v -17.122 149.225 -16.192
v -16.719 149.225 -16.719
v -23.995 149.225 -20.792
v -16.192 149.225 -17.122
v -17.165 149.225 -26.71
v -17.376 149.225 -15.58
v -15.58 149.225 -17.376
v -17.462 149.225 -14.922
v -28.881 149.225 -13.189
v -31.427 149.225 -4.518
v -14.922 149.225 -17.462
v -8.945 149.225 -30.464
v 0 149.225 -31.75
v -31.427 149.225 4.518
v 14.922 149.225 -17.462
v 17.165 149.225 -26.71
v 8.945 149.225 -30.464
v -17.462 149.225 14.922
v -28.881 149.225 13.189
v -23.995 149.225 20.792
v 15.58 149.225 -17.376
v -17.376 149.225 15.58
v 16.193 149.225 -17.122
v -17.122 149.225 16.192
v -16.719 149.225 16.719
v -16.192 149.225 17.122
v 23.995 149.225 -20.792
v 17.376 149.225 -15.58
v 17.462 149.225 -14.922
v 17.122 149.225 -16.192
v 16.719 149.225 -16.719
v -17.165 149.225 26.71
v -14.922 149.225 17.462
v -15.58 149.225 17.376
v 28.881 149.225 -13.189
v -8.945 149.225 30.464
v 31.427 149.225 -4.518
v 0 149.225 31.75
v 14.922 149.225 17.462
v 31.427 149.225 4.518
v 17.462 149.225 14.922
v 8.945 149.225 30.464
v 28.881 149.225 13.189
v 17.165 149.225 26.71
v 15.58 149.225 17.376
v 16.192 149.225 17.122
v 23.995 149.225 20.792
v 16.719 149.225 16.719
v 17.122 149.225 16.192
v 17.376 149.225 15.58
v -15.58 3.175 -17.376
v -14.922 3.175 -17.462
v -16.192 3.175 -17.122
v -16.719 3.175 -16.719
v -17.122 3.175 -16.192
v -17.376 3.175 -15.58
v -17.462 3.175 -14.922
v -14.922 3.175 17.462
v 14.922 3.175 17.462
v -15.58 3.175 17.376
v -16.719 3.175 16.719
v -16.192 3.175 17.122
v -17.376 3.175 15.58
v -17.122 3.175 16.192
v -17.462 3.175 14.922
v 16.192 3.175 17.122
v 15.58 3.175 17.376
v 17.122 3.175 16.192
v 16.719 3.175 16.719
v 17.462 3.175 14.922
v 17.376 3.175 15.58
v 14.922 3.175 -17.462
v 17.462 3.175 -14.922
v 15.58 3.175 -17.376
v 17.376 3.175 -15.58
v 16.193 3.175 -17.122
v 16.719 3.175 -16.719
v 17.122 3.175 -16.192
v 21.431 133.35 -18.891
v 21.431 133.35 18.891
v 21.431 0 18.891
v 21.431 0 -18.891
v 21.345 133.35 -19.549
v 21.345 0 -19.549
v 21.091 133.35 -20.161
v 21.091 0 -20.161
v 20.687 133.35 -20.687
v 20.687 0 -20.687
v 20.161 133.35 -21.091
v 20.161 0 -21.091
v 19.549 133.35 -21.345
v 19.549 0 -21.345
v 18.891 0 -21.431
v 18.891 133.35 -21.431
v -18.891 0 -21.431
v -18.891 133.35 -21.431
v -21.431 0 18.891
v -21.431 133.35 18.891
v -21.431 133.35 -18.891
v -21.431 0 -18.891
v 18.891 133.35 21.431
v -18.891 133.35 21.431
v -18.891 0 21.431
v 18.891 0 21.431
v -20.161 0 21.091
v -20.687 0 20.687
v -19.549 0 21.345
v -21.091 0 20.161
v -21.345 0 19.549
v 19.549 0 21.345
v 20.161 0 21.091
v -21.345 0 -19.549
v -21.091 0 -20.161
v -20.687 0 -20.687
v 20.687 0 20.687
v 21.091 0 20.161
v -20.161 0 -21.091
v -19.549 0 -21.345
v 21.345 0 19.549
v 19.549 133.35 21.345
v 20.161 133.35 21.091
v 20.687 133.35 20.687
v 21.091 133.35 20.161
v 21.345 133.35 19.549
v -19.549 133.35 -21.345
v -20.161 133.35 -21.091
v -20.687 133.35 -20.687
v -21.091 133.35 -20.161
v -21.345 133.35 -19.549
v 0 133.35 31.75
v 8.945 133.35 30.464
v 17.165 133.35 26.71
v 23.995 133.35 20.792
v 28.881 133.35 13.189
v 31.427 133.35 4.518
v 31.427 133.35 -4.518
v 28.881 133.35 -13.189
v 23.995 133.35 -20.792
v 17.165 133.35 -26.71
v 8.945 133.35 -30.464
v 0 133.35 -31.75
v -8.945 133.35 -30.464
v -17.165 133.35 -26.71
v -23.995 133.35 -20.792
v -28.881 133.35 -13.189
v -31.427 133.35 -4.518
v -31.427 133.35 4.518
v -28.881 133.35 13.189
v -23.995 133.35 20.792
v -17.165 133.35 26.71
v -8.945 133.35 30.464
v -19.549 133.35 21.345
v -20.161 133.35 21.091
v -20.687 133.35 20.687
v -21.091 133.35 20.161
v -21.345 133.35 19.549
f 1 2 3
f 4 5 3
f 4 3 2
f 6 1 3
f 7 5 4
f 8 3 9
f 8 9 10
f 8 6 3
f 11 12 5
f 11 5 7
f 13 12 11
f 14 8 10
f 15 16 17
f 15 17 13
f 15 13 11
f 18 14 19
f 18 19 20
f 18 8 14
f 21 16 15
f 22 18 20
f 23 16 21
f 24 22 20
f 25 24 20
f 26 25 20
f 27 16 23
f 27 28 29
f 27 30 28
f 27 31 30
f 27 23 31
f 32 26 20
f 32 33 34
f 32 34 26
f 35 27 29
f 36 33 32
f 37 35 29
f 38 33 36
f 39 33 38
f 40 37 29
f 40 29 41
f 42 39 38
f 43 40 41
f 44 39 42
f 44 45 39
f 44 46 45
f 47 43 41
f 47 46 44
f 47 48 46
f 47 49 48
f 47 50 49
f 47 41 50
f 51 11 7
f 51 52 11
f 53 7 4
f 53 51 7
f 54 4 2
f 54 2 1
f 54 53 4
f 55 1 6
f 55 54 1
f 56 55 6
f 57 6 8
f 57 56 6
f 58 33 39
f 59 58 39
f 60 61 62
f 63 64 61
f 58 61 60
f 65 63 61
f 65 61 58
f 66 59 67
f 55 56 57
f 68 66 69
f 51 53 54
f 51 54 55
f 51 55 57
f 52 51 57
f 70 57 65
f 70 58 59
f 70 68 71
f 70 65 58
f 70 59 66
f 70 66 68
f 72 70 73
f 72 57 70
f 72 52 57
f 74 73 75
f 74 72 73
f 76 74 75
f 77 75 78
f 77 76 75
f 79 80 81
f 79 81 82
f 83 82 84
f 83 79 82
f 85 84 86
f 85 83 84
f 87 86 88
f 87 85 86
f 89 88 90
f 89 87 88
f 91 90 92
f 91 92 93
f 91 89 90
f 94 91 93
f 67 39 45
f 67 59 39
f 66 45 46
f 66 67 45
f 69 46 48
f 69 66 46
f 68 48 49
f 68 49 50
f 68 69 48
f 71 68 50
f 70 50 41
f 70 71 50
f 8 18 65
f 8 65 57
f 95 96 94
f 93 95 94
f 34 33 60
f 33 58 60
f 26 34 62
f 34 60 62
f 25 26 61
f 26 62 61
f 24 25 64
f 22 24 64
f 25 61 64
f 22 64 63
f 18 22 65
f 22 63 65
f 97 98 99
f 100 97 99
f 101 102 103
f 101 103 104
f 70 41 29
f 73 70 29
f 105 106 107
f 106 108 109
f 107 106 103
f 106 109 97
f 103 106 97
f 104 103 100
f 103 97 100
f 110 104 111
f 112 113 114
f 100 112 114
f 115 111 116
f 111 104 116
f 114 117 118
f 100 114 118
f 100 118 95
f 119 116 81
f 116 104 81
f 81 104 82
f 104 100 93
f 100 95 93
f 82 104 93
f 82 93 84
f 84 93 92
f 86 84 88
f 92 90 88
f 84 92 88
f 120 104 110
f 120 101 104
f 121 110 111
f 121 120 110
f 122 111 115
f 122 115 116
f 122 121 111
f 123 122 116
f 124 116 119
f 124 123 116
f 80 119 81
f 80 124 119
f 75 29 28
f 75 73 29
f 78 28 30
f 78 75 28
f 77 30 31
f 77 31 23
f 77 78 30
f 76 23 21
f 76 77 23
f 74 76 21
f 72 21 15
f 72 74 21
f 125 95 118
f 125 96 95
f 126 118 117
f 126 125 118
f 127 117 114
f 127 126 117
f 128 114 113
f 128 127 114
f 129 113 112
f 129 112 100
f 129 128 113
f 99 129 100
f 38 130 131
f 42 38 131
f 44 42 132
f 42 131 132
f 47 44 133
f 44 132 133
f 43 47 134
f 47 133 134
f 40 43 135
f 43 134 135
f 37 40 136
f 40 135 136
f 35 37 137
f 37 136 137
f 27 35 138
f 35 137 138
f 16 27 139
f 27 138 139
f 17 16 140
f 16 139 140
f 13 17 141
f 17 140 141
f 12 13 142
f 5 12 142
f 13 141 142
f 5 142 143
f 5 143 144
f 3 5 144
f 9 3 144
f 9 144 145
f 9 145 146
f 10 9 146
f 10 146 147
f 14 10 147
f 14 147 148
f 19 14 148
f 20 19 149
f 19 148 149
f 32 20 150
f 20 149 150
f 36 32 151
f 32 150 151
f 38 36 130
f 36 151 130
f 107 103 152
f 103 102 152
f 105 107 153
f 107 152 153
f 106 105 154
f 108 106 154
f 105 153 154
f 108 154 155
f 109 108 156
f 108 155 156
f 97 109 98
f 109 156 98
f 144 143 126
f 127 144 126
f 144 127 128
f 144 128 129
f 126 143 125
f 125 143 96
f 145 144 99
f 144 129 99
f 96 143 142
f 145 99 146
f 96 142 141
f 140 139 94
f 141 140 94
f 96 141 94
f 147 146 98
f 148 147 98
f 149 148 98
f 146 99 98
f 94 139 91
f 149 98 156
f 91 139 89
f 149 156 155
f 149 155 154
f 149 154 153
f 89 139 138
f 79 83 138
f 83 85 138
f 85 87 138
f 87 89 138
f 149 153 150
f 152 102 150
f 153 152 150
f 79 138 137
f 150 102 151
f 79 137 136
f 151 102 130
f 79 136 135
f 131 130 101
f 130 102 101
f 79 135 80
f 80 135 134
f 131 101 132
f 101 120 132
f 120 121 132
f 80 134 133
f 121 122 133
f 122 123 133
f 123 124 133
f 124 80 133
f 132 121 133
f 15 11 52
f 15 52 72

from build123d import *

# Parameters (mm, degrees)
SKETCH1_W           = 42.8625
SKETCH1_H           = 42.8625
BOSS_EXTRUDE1_DEPTH = 133.35
SKETCH2_R           = 31.75
BOSS_EXTRUDE2_DEPTH = 15.875
SKETCH3_W           = 34.925
SKETCH3_H           = 34.925
CUT_EXTRUDE1_DEPTH  = 146.05
FILLET1_R           = 2.54


with BuildPart() as part:
    # Sketch1 → Boss-Extrude1 (new body)
    with BuildSketch(Plane(origin=(0, 0, 0), x_dir=(1, 0, 0), z_dir=(0, 1, 0))):
        Rectangle(SKETCH1_W, SKETCH1_H)
    extrude(amount=BOSS_EXTRUDE1_DEPTH)

    # Sketch2 → Boss-Extrude2 (add)
    with BuildSketch(Plane(origin=(0, 133.35, 0), x_dir=(1, 0, 0), z_dir=(0, 1, 0))):
        with Locations(Location((0, 0, 0), (0, 0, 270))):
            Circle(SKETCH2_R)
    extrude(amount=BOSS_EXTRUDE2_DEPTH)

    # Sketch3 → Cut-Extrude1 (cut)
    with BuildSketch(Plane(origin=(0, 149.225, 0), x_dir=(1, 0, 0), z_dir=(0, 1, 0))):
        Rectangle(SKETCH3_W, SKETCH3_H)
    extrude(amount=-CUT_EXTRUDE1_DEPTH, mode=Mode.SUBTRACT)

    # Fillet1
    fillet1_edges = [part.edges().sort_by_distance(p)[0] for p in [
        (17.4625, 76.2, 17.4625),
        (17.4625, 76.2, -17.4625),
        (-17.4625, 76.2, -17.4625),
        (-17.4625, 76.2, 17.4625),
        (-21.43125, 66.675, -21.43125),
        (21.43125, 66.675, -21.43125),
        (21.43125, 66.675, 21.43125),
        (-21.43125, 66.675, 21.43125),
    ]]
    fillet(fillet1_edges, radius=FILLET1_R)


solid = part.part
